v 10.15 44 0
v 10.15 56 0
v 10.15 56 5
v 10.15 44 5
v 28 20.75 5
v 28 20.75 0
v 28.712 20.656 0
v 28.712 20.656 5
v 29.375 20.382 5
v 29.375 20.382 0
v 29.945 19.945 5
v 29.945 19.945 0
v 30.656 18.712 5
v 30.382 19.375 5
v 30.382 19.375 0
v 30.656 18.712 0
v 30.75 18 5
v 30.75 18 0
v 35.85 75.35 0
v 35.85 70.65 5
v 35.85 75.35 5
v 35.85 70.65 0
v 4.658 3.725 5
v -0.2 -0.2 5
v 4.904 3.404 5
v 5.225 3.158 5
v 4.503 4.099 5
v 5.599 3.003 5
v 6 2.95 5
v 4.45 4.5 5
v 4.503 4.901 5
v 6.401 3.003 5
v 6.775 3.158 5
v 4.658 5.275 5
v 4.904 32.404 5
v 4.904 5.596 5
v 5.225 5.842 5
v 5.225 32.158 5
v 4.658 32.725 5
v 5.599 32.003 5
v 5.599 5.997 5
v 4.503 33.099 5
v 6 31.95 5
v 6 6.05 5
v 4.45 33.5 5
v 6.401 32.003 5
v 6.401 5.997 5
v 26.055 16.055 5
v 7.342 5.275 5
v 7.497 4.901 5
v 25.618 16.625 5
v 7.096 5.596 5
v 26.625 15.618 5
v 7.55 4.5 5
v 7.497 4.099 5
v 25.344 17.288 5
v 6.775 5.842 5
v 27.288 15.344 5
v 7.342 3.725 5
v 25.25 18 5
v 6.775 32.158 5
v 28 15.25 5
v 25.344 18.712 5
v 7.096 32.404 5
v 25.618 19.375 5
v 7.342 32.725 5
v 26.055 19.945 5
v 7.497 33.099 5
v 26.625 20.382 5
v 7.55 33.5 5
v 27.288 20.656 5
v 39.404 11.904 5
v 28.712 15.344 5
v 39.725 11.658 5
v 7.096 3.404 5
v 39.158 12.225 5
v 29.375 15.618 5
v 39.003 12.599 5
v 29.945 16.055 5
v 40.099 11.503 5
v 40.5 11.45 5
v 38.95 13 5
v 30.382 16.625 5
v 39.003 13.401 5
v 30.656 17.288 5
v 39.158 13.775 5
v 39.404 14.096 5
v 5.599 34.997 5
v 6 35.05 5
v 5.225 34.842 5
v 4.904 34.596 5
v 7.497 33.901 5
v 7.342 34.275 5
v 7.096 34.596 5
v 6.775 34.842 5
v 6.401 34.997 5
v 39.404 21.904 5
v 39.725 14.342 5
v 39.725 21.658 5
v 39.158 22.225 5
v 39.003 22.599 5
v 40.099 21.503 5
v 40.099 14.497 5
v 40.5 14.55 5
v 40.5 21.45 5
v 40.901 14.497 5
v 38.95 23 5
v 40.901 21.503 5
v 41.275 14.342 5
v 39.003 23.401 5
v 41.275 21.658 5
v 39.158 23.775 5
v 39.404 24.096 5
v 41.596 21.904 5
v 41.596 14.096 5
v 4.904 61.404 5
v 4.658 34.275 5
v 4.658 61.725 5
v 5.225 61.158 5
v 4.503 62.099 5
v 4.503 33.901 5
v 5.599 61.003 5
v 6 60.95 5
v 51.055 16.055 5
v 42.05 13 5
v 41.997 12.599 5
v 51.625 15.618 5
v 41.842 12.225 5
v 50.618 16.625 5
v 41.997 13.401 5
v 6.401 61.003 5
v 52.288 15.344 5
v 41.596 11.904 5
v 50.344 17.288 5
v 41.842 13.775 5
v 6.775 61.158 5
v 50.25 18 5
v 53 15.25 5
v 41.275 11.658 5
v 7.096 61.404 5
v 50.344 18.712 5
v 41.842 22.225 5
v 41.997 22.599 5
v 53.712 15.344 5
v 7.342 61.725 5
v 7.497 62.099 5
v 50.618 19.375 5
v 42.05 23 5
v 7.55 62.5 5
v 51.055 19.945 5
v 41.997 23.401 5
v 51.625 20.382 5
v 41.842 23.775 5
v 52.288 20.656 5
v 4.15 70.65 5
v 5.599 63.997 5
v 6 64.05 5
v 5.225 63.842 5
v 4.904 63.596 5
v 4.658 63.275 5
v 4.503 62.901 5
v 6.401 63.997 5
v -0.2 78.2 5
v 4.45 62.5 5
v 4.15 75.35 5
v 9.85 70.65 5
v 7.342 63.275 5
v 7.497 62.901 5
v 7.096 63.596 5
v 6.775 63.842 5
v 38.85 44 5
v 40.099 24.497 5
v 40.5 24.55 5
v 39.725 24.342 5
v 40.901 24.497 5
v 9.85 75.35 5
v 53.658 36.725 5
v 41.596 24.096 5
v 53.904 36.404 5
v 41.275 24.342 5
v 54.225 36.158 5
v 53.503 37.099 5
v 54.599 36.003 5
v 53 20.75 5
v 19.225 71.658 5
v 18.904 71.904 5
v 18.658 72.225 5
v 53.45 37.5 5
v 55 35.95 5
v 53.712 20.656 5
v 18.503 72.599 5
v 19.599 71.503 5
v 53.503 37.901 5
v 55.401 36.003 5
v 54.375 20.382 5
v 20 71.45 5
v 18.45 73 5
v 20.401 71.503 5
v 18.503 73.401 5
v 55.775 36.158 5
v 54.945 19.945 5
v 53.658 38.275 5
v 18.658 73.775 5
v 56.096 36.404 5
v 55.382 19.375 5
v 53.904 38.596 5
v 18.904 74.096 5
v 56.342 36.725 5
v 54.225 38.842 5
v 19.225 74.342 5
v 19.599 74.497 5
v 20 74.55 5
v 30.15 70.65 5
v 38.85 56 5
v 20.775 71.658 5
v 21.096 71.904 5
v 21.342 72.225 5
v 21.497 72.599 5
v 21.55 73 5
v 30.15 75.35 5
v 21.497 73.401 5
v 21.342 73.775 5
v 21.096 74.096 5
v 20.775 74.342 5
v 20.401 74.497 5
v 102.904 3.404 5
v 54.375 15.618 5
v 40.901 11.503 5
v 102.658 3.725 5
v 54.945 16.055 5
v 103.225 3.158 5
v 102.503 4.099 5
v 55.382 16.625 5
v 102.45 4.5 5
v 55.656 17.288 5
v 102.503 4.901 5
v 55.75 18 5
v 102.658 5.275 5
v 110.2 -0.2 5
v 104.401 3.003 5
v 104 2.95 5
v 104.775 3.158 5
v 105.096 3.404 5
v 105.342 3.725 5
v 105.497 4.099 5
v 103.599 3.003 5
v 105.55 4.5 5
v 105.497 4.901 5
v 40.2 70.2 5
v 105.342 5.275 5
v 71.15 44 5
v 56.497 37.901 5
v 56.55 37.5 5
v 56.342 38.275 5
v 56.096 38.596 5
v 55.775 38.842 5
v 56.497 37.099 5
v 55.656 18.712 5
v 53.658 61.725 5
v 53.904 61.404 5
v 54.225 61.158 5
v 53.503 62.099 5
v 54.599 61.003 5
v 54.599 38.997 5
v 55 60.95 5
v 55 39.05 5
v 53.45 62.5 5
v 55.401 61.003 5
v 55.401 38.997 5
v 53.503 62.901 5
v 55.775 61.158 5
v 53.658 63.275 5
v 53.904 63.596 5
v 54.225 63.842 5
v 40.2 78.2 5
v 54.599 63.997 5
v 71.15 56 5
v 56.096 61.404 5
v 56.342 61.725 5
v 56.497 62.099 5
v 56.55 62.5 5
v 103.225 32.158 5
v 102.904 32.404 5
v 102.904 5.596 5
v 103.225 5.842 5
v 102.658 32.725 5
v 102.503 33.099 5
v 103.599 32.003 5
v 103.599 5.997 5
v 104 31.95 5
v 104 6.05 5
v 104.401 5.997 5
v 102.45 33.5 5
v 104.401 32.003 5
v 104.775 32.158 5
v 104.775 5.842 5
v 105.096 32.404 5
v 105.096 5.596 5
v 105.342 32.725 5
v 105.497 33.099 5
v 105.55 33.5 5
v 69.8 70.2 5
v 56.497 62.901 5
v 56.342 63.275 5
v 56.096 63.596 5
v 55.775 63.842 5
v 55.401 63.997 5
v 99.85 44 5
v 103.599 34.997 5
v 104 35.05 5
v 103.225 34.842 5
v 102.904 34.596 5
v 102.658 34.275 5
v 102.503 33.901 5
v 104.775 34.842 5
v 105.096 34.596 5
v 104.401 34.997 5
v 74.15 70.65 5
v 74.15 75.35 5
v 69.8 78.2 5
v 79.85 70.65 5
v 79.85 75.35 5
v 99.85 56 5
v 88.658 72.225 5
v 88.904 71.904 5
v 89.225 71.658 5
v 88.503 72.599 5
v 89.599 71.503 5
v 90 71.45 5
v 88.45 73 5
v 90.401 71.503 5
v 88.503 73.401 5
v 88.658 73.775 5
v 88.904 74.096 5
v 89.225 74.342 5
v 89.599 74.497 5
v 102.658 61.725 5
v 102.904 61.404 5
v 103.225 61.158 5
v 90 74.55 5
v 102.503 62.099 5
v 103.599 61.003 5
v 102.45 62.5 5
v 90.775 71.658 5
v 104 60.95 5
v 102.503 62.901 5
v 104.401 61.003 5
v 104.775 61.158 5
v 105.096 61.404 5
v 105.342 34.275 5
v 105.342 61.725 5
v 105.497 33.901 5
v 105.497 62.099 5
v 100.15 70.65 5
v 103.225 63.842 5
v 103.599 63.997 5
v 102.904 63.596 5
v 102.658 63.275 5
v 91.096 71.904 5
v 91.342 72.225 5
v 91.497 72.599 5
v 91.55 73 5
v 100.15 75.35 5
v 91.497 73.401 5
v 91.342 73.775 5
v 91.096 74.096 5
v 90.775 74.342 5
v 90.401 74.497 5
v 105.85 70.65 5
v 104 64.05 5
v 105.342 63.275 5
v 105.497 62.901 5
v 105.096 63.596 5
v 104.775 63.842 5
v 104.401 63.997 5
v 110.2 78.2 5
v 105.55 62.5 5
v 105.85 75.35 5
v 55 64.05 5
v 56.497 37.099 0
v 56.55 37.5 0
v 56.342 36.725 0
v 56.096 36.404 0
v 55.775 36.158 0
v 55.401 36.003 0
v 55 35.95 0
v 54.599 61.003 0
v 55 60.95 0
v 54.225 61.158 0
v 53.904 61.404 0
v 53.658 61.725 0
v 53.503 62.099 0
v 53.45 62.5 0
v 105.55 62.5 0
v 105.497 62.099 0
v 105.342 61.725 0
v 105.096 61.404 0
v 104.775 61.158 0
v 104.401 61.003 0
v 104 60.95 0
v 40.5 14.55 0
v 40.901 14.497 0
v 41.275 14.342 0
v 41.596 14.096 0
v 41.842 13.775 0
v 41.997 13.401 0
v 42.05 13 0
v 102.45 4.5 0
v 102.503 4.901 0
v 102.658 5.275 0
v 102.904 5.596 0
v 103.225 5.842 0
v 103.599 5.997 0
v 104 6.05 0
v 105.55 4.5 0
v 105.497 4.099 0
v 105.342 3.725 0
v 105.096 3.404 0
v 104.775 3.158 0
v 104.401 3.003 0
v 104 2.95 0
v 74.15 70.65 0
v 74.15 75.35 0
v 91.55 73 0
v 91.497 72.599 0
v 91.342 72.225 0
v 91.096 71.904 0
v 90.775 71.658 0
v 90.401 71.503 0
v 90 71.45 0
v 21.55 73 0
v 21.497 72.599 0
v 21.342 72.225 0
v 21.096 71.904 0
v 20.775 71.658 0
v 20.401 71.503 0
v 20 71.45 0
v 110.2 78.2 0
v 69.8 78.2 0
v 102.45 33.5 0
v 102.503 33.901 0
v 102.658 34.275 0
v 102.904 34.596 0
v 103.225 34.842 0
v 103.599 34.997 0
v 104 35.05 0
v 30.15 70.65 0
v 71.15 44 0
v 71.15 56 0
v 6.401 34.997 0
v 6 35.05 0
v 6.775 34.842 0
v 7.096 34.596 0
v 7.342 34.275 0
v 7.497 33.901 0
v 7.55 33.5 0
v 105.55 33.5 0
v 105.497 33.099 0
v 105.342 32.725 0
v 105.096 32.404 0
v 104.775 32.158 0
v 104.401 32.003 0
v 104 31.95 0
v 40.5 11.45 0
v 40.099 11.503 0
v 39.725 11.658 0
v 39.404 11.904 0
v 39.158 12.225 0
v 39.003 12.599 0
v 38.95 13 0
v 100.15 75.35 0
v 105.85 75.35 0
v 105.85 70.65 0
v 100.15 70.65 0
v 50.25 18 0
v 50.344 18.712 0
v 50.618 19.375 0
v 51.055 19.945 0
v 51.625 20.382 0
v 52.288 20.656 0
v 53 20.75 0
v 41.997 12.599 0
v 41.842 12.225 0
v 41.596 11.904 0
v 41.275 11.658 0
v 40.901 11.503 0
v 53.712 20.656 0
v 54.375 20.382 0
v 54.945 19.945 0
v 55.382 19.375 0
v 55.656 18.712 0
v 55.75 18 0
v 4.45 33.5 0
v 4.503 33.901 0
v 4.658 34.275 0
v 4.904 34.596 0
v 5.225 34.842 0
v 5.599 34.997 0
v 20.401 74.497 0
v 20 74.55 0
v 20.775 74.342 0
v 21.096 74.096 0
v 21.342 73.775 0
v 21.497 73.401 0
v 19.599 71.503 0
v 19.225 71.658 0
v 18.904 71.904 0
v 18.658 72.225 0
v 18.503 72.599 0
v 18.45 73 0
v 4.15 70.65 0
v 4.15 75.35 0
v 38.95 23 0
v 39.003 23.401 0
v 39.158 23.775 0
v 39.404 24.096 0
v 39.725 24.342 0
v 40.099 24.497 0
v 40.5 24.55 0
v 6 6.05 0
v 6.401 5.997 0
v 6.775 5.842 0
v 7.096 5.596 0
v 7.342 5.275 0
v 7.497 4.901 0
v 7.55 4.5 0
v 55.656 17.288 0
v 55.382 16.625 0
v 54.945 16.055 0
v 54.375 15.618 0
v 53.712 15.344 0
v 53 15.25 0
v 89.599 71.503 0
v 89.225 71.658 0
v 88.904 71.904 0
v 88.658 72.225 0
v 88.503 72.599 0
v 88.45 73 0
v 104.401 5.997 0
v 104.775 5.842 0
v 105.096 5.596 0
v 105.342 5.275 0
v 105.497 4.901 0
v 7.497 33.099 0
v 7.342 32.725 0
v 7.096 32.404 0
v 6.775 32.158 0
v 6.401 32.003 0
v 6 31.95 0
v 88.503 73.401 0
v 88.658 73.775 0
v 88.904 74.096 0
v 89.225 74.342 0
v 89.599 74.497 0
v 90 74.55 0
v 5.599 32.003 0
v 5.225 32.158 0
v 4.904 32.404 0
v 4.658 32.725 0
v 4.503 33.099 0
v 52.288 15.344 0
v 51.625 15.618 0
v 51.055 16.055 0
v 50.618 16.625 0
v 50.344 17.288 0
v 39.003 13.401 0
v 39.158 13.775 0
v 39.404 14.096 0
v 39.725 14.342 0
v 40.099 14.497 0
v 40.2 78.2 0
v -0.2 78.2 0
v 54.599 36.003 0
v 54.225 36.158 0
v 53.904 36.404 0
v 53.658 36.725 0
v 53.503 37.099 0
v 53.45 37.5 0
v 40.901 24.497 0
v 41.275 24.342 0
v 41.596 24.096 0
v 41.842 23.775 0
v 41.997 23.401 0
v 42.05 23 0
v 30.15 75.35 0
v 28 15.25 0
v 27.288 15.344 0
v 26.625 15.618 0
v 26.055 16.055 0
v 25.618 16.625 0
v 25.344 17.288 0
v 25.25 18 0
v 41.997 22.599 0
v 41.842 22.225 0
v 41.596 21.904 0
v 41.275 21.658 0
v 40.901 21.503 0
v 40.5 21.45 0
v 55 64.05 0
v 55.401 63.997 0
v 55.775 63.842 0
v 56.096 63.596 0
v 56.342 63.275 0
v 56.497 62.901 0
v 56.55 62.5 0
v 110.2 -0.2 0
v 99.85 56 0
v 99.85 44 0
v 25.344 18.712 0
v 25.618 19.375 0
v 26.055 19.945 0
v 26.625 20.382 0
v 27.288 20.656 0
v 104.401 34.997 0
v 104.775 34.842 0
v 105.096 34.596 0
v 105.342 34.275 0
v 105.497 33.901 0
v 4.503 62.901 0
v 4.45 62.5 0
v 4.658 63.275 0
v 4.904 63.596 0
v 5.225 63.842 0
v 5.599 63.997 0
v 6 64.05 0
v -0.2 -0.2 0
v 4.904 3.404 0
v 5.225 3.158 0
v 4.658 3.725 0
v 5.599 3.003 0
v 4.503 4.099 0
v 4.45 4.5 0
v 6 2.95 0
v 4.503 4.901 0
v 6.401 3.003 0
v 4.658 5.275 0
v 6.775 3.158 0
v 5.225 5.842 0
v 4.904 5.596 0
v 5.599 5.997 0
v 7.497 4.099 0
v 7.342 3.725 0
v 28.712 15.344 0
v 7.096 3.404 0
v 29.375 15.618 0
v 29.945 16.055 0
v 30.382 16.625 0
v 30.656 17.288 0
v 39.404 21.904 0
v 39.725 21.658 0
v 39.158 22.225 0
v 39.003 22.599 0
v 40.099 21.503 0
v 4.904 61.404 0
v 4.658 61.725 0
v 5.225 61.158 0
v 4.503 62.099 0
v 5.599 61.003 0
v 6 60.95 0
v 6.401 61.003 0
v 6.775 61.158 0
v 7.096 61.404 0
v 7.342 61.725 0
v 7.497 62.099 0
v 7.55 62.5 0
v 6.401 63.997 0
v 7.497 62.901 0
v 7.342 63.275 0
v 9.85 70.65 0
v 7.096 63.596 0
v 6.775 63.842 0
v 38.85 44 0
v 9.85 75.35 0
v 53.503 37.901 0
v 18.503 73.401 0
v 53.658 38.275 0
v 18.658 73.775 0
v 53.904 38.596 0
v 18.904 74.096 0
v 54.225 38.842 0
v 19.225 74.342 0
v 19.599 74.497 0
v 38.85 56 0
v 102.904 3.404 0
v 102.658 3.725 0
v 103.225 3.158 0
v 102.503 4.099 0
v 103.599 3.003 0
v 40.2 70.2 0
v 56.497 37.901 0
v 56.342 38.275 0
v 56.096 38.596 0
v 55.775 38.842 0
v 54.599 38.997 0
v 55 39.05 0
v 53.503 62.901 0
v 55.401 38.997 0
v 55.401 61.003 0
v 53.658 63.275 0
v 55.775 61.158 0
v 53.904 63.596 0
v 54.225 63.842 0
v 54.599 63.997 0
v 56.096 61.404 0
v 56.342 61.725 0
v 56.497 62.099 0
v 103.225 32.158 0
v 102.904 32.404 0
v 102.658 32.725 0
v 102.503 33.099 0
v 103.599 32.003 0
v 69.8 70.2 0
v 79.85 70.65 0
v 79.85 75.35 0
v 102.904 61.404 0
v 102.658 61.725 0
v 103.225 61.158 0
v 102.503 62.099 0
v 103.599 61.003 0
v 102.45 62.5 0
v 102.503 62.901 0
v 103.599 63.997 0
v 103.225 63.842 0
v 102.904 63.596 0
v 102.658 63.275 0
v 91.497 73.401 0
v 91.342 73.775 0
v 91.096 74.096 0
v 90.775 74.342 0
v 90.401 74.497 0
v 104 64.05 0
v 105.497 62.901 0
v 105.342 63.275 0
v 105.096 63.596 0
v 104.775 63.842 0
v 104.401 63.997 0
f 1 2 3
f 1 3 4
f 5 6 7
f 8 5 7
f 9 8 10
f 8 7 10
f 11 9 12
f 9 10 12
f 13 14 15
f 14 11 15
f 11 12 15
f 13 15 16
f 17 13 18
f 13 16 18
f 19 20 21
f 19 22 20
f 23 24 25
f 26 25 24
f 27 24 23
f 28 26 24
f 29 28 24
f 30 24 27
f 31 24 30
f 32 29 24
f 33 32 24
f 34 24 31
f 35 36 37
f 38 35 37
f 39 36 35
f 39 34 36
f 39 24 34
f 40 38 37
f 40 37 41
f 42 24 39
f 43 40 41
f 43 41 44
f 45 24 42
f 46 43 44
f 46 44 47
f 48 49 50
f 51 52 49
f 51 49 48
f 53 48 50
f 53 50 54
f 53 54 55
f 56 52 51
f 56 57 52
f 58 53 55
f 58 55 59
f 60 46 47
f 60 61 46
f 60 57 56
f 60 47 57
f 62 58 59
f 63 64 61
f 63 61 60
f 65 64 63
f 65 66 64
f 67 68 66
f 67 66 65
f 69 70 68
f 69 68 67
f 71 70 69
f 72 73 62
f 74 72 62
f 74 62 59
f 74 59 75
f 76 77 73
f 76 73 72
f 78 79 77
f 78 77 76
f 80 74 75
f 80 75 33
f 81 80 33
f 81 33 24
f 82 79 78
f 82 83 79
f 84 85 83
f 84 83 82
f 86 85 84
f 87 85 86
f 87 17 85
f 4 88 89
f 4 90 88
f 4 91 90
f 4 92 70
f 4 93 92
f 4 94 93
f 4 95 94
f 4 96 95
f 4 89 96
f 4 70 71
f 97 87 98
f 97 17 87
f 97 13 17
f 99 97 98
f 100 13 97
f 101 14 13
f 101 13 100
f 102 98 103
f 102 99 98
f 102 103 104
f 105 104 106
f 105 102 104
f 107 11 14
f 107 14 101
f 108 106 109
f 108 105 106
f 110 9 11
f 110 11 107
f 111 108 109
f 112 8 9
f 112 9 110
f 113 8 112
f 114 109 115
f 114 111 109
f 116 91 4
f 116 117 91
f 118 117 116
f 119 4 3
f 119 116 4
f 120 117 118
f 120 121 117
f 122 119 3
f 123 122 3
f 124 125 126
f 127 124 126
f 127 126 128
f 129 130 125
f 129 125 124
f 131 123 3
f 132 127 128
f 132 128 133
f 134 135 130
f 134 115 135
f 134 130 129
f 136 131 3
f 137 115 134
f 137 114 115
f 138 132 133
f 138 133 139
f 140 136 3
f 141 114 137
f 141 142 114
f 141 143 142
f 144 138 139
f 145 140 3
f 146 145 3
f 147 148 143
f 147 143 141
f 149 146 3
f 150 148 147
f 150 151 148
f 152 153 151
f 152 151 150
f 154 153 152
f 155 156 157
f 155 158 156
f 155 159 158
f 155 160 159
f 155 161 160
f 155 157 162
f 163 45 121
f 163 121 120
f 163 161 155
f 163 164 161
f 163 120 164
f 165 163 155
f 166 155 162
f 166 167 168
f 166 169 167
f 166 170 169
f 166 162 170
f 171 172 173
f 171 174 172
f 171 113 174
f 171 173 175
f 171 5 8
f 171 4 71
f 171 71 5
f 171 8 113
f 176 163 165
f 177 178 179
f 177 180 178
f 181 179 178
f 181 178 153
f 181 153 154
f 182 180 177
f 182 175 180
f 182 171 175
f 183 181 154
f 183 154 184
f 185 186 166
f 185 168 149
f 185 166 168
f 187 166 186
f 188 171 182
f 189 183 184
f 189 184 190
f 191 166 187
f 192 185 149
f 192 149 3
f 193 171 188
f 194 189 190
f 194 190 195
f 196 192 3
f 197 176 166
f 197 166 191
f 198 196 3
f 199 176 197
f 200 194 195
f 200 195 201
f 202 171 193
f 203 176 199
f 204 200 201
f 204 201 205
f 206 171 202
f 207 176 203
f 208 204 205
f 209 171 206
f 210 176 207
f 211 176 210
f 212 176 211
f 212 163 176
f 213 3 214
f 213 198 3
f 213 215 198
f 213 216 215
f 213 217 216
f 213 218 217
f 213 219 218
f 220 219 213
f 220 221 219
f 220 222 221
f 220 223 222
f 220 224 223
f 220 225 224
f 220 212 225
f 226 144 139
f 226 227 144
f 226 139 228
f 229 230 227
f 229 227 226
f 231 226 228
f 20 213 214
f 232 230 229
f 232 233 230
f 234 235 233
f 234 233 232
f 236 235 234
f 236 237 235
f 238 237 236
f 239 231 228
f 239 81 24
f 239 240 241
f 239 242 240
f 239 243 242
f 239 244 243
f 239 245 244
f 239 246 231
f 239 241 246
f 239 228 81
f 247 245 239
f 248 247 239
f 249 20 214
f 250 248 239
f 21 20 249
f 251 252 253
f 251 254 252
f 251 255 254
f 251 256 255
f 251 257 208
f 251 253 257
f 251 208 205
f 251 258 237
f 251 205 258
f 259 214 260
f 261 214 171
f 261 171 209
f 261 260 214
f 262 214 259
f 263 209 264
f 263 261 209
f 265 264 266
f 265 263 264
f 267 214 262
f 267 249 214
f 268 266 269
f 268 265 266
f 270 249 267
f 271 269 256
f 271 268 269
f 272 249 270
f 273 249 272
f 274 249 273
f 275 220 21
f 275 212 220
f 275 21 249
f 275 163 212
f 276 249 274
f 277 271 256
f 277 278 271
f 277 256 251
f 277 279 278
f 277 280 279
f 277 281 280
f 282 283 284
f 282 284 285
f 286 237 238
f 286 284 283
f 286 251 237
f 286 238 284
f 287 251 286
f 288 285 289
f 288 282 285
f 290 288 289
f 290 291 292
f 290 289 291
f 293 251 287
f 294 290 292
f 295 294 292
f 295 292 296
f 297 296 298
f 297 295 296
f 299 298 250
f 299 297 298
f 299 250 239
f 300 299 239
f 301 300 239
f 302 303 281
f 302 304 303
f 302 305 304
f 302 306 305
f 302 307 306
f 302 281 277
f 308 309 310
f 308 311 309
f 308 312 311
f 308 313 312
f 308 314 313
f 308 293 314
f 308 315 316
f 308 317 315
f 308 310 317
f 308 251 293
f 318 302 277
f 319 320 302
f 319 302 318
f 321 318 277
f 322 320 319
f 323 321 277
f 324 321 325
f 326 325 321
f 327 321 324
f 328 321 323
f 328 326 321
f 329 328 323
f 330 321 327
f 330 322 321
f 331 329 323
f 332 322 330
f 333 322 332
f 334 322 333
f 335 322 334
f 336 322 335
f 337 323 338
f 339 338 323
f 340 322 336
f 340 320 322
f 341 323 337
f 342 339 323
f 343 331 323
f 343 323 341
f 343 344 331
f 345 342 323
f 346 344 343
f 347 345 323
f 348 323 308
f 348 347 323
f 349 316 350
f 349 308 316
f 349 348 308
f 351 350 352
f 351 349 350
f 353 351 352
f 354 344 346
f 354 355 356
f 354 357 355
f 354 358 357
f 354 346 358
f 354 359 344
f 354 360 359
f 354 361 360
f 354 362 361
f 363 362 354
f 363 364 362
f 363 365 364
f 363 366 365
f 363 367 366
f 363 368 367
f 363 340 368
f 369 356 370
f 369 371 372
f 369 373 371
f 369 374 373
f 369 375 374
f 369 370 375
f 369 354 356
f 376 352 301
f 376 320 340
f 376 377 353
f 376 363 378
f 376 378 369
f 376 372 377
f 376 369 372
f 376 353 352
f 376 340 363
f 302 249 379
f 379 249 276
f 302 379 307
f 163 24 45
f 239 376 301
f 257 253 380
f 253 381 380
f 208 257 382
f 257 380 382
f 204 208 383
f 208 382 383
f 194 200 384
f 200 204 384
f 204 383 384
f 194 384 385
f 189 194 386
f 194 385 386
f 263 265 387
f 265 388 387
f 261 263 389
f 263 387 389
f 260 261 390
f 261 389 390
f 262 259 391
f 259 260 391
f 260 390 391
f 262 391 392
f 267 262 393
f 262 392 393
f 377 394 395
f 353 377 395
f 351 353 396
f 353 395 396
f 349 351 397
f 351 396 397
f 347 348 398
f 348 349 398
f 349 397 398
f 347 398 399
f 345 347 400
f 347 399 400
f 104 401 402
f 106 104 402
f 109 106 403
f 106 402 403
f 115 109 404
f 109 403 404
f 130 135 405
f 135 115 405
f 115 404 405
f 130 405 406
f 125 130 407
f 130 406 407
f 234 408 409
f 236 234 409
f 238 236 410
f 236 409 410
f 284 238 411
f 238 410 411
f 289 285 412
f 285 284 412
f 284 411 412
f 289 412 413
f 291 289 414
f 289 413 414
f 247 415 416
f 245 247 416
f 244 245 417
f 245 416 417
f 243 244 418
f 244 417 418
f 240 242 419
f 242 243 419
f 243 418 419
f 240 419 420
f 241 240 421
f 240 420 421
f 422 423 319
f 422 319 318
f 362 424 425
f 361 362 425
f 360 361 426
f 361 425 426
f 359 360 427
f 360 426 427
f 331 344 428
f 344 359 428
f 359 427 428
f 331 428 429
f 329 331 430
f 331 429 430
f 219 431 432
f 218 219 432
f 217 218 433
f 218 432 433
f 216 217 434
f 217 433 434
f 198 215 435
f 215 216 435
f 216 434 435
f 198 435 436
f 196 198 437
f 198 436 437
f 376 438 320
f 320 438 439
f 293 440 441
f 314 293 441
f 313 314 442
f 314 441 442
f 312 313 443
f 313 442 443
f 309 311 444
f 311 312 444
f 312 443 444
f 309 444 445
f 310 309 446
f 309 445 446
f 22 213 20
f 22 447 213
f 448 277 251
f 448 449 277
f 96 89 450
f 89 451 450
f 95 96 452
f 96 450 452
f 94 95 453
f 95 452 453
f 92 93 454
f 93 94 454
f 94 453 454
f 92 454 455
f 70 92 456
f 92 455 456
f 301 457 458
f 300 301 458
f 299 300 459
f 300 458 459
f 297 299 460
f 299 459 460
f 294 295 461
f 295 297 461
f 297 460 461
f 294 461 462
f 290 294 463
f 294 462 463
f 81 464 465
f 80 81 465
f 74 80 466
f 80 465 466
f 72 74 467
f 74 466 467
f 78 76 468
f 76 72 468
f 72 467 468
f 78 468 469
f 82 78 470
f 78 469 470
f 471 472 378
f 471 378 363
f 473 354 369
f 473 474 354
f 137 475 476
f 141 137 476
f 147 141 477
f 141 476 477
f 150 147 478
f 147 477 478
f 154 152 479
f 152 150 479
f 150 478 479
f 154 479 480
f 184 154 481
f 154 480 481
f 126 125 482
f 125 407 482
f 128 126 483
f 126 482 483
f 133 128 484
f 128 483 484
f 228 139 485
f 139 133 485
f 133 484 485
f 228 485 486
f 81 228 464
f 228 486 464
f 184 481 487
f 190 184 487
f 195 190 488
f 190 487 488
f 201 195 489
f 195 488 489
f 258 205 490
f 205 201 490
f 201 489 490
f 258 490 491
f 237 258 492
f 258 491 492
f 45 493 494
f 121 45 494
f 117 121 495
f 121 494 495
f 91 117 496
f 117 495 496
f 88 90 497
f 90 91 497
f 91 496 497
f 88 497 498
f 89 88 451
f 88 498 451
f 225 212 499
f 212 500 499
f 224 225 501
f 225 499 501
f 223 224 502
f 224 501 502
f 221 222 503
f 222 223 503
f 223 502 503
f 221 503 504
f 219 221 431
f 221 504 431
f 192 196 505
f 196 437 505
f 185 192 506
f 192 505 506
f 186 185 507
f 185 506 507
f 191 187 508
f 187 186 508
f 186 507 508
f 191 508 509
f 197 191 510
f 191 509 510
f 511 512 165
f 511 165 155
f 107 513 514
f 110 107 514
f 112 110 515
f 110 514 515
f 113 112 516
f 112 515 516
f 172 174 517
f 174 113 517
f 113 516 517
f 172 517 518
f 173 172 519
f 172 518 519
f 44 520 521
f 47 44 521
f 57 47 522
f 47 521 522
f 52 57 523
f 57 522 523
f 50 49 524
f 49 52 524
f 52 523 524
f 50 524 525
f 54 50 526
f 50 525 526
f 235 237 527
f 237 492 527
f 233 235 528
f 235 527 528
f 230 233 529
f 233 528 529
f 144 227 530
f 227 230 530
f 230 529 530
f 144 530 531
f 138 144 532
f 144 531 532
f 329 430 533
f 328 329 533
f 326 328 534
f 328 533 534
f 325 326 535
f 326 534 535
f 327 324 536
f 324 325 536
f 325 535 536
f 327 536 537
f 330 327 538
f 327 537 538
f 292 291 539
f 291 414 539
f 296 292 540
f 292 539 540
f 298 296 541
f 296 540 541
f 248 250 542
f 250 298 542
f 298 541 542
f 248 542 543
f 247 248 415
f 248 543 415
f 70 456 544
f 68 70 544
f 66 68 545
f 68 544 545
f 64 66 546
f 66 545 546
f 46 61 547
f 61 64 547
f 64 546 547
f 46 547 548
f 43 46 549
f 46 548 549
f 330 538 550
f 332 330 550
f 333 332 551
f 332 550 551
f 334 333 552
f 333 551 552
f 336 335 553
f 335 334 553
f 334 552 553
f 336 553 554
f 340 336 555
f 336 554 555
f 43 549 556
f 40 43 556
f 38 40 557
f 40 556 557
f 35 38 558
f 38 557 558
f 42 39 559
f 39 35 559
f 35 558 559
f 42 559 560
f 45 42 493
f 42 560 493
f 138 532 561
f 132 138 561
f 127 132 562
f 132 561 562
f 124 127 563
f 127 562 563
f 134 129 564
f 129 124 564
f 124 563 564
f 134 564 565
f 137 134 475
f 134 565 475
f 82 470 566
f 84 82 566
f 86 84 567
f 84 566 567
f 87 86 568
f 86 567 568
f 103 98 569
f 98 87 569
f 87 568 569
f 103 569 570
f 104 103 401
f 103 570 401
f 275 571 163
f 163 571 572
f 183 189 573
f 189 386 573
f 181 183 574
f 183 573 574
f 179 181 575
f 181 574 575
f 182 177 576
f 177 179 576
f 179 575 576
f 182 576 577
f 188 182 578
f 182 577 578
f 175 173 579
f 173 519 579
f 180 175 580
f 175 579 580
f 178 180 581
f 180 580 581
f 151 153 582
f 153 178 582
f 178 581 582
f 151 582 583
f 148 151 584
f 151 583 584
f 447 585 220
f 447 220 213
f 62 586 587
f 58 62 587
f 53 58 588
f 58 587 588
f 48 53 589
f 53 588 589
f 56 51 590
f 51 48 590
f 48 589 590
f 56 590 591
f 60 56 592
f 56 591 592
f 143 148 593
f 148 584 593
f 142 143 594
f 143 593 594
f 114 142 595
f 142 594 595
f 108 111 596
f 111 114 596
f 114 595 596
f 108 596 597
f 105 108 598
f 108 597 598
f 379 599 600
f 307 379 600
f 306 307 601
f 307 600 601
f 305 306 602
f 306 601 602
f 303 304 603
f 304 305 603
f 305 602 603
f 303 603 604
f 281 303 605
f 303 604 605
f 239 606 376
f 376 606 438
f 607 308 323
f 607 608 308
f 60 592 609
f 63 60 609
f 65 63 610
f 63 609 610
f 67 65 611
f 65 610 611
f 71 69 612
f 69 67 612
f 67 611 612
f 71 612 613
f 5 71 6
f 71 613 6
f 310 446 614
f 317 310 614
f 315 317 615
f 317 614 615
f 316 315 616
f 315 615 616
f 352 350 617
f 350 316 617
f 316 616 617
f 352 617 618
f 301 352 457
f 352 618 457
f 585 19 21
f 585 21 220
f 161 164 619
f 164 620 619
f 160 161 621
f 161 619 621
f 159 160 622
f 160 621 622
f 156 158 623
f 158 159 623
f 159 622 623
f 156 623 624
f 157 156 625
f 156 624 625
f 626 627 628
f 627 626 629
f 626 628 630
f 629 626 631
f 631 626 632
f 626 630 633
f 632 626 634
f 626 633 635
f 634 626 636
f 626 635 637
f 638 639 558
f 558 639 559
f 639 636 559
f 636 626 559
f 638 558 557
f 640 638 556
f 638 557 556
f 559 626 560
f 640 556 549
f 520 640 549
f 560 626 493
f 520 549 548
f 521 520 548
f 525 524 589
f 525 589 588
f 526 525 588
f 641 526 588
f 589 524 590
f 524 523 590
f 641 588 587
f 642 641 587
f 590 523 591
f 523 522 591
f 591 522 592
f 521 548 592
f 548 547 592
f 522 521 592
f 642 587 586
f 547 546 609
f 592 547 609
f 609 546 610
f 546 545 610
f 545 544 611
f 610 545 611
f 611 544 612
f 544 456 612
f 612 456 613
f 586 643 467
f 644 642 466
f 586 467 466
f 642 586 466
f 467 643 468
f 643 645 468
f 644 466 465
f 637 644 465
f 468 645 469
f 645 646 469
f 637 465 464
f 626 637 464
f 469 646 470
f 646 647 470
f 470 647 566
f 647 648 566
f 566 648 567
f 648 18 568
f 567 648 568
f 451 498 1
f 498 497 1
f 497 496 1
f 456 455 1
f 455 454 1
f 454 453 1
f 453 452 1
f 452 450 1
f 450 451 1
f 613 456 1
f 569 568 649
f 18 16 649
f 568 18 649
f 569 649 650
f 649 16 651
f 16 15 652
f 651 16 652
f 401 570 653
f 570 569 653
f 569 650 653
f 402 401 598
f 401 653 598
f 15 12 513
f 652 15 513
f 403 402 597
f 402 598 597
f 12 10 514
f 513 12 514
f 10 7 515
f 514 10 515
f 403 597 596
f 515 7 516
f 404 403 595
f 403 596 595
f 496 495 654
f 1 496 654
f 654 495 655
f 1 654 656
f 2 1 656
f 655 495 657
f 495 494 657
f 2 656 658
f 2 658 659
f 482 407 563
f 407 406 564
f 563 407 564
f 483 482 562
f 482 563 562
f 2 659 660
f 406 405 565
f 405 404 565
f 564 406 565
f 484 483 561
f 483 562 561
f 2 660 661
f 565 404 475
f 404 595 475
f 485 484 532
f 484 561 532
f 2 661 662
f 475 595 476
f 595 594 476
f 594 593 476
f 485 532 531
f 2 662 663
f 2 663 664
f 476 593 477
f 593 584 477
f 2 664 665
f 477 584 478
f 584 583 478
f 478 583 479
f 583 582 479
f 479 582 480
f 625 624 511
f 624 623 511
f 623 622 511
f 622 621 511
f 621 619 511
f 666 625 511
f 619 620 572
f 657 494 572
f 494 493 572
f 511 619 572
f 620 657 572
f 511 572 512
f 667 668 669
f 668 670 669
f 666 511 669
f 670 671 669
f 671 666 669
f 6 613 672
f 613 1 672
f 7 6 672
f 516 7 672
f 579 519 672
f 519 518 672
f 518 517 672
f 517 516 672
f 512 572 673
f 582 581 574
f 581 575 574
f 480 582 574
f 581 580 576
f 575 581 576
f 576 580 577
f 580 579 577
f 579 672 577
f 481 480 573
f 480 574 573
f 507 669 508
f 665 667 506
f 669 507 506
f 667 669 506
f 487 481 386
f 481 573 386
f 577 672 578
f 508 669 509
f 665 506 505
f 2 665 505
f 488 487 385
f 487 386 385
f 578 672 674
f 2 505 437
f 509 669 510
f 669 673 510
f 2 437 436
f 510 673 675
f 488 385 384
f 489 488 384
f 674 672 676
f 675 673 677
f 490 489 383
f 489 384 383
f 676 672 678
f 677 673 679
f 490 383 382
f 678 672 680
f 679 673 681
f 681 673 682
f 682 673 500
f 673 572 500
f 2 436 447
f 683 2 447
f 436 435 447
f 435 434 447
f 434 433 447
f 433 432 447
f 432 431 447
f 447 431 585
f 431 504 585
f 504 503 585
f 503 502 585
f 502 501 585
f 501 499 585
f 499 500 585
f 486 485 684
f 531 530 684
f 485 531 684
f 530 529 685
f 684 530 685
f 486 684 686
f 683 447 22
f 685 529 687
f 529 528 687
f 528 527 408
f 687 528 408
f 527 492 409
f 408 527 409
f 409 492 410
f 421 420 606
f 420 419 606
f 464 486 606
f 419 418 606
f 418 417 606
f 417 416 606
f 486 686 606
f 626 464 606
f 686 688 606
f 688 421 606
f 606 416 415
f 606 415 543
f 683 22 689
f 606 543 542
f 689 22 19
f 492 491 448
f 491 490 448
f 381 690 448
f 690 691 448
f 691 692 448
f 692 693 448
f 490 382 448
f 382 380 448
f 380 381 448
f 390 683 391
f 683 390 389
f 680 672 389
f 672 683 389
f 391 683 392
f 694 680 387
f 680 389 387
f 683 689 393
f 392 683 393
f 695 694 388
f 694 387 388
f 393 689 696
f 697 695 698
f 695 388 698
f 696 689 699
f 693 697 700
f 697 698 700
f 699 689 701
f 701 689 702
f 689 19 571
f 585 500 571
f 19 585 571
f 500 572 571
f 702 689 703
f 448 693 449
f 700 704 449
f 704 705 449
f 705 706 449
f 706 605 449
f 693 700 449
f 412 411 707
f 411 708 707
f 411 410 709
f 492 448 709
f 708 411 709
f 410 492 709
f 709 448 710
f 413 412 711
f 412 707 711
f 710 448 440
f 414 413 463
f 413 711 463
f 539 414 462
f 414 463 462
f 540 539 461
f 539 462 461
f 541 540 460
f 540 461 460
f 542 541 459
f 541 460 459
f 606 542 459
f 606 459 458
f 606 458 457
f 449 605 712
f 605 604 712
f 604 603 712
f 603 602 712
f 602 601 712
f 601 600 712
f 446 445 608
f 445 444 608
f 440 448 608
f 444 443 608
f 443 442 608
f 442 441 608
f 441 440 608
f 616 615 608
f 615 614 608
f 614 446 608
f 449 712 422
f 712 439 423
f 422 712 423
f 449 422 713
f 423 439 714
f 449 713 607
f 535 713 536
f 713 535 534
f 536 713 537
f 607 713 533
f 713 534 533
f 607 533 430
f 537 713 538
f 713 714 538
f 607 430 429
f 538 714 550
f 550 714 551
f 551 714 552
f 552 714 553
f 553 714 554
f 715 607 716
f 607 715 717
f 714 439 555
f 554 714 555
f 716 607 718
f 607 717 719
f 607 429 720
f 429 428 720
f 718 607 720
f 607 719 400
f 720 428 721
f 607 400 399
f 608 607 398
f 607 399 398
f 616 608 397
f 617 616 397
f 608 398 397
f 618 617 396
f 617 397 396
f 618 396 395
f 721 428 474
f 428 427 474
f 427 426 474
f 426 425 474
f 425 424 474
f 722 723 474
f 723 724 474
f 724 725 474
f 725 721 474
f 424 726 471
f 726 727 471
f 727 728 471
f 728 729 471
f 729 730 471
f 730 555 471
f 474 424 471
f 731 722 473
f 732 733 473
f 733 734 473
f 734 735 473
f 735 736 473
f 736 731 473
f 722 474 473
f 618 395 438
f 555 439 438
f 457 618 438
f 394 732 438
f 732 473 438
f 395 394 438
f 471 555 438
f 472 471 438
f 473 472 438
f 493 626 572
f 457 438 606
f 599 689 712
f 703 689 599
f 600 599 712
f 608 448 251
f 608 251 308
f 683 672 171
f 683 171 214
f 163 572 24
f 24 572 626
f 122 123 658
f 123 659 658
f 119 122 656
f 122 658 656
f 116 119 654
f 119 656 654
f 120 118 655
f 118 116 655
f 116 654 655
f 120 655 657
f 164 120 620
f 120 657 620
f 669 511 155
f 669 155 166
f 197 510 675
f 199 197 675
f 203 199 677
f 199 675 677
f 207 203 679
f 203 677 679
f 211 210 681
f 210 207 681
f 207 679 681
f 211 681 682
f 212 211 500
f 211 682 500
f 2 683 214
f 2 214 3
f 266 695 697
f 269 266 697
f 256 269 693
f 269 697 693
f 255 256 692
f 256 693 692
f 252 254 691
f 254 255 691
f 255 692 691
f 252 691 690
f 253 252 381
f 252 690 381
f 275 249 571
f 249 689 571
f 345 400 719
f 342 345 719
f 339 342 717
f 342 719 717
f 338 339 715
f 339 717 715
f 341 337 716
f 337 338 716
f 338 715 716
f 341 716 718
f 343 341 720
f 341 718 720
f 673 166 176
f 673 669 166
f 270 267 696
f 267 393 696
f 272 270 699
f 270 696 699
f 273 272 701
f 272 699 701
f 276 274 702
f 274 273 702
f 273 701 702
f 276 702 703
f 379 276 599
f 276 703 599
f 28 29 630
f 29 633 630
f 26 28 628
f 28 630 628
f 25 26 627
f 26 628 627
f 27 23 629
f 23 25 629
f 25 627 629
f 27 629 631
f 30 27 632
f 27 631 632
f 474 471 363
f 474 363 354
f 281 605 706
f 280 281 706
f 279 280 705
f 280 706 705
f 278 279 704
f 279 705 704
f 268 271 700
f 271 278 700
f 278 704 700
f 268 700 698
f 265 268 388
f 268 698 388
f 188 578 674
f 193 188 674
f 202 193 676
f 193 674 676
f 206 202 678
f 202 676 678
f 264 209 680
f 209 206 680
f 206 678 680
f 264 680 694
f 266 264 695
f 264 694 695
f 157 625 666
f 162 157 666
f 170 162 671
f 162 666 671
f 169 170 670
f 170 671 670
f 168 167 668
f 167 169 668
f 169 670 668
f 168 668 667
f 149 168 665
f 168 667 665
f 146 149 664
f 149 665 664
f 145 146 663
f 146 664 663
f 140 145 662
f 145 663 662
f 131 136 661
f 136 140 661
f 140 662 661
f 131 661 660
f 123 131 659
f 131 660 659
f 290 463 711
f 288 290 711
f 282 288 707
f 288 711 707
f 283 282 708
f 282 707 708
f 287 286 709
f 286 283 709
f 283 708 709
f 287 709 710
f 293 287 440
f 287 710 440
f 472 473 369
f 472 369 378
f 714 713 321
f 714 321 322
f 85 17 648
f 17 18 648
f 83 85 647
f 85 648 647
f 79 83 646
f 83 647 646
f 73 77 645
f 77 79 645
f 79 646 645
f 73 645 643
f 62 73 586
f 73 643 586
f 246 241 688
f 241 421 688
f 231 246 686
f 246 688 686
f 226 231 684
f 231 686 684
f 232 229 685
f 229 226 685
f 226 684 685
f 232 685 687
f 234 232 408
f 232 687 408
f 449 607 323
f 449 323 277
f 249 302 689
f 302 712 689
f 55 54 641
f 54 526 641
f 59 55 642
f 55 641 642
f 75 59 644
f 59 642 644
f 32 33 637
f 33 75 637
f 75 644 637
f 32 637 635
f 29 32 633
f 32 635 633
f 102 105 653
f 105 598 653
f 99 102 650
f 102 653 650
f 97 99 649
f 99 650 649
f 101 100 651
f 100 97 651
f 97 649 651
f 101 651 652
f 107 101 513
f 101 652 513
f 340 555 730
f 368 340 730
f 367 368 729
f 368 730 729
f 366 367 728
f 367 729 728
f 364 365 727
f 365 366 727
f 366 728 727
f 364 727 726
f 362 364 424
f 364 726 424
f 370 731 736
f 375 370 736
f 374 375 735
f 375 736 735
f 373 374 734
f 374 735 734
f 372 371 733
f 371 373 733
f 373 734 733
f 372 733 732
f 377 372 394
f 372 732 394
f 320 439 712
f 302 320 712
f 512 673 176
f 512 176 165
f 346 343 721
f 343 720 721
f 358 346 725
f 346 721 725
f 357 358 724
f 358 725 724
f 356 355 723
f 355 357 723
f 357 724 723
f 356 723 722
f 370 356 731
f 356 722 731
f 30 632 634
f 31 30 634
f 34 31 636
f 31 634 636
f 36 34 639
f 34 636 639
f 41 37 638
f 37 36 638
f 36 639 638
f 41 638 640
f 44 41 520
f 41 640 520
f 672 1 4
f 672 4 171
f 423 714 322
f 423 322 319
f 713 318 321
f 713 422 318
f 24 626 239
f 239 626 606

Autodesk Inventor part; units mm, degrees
ref_plane "YZ Plane" through (0, 0, 0) normal (1, 0, 0) x (0, 1, 0)
ref_plane "XZ Plane" through (0, 0, 0) normal (0, 1, 0) x (-1, 0, 0)
ref_plane "XY Plane" through (0, 0, 0) normal (0, 0, 1) x (1, 0, 0)
sketch "Boceto1" plane through (0, 0, 0) normal (0, 0, 1) x (1, 0, 0)
  arc A0 (6, 64.05) -> (4.45, 62.5) centre (6, 62.5) ccw
  arc A1 (4.45, 62.5) -> (6, 60.95) centre (6, 62.5) ccw
  arc A2 (6, 60.95) -> (7.55, 62.5) centre (6, 62.5) ccw
  arc A3 (7.55, 62.5) -> (6, 64.05) centre (6, 62.5) ccw
  arc A4 (55, 64.05) -> (53.45, 62.5) centre (55, 62.5) ccw
  arc A5 (53.45, 62.5) -> (55, 60.95) centre (55, 62.5) ccw
  arc A6 (55, 60.95) -> (56.55, 62.5) centre (55, 62.5) ccw
  arc A7 (56.55, 62.5) -> (55, 64.05) centre (55, 62.5) ccw
  arc A8 (104, 64.05) -> (102.45, 62.5) centre (104, 62.5) ccw
  arc A9 (102.45, 62.5) -> (104, 60.95) centre (104, 62.5) ccw
  arc A10 (104, 60.95) -> (105.55, 62.5) centre (104, 62.5) ccw
  arc A11 (105.55, 62.5) -> (104, 64.05) centre (104, 62.5) ccw
  arc A12 (6, 35.05) -> (4.45, 33.5) centre (6, 33.5) ccw
  arc A13 (4.45, 33.5) -> (6, 31.95) centre (6, 33.5) ccw
  arc A14 (6, 31.95) -> (7.55, 33.5) centre (6, 33.5) ccw
  arc A15 (7.55, 33.5) -> (6, 35.05) centre (6, 33.5) ccw
  arc A16 (55, 39.05) -> (53.45, 37.5) centre (55, 37.5) ccw
  arc A17 (53.45, 37.5) -> (55, 35.95) centre (55, 37.5) ccw
  arc A18 (55, 35.95) -> (56.55, 37.5) centre (55, 37.5) ccw
  arc A19 (56.55, 37.5) -> (55, 39.05) centre (55, 37.5) ccw
  arc A20 (104, 35.05) -> (102.45, 33.5) centre (104, 33.5) ccw
  arc A21 (102.45, 33.5) -> (104, 31.95) centre (104, 33.5) ccw
  arc A22 (104, 31.95) -> (105.55, 33.5) centre (104, 33.5) ccw
  arc A23 (105.55, 33.5) -> (104, 35.05) centre (104, 33.5) ccw
  arc A24 (6, 6.05) -> (4.45, 4.5) centre (6, 4.5) ccw
  arc A25 (4.45, 4.5) -> (6, 2.95) centre (6, 4.5) ccw
  arc A26 (6, 2.95) -> (7.55, 4.5) centre (6, 4.5) ccw
  arc A27 (7.55, 4.5) -> (6, 6.05) centre (6, 4.5) ccw
  arc A28 (104, 6.05) -> (102.45, 4.5) centre (104, 4.5) ccw
  arc A29 (102.45, 4.5) -> (104, 2.95) centre (104, 4.5) ccw
  arc A30 (104, 2.95) -> (105.55, 4.5) centre (104, 4.5) ccw
  arc A31 (105.55, 4.5) -> (104, 6.05) centre (104, 4.5) ccw
  arc A32 (40.5, 24.55) -> (38.95, 23) centre (40.5, 23) ccw
  arc A33 (38.95, 23) -> (40.5, 21.45) centre (40.5, 23) ccw
  arc A34 (40.5, 21.45) -> (42.05, 23) centre (40.5, 23) ccw
  arc A35 (42.05, 23) -> (40.5, 24.55) centre (40.5, 23) ccw
  arc A36 (40.5, 14.55) -> (38.95, 13) centre (40.5, 13) ccw
  arc A37 (38.95, 13) -> (40.5, 11.45) centre (40.5, 13) ccw
  arc A38 (40.5, 11.45) -> (42.05, 13) centre (40.5, 13) ccw
  arc A39 (42.05, 13) -> (40.5, 14.55) centre (40.5, 13) ccw
  arc A40 (20, 74.55) -> (18.45, 73) centre (20, 73) ccw
  arc A41 (18.45, 73) -> (20, 71.45) centre (20, 73) ccw
  arc A42 (20, 71.45) -> (21.55, 73) centre (20, 73) ccw
  arc A43 (21.55, 73) -> (20, 74.55) centre (20, 73) ccw
  arc A44 (90, 74.55) -> (88.45, 73) centre (90, 73) ccw
  arc A45 (88.45, 73) -> (90, 71.45) centre (90, 73) ccw
  arc A46 (90, 71.45) -> (91.55, 73) centre (90, 73) ccw
  arc A47 (91.55, 73) -> (90, 74.55) centre (90, 73) ccw
  line L0 (9.85, 75.35) -> (4.15, 75.35)
  line L1 (4.15, 75.35) -> (4.15, 70.65)
  line L2 (4.15, 70.65) -> (9.85, 70.65)
  line L3 (9.85, 70.65) -> (9.85, 75.35)
  line L4 (35.85, 70.65) -> (35.85, 75.35)
  line L5 (35.85, 75.35) -> (30.15, 75.35)
  line L6 (30.15, 75.35) -> (30.15, 70.65)
  line L7 (30.15, 70.65) -> (35.85, 70.65)
  line L8 (74.15, 70.65) -> (79.85, 70.65)
  line L9 (79.85, 70.65) -> (79.85, 75.35)
  line L10 (79.85, 75.35) -> (74.15, 75.35)
  line L11 (74.15, 75.35) -> (74.15, 70.65)
  line L12 (105.85, 70.65) -> (105.85, 75.35)
  line L13 (105.85, 75.35) -> (100.15, 75.35)
  line L14 (100.15, 75.35) -> (100.15, 70.65)
  line L15 (100.15, 70.65) -> (105.85, 70.65)
  line L16 (38.85, 44) -> (38.85, 56)
  line L17 (38.85, 56) -> (10.15, 56)
  line L18 (10.15, 56) -> (10.15, 44)
  line L19 (10.15, 44) -> (38.85, 44)
  line L20 (71.15, 44) -> (99.85, 44)
  line L21 (99.85, 44) -> (99.85, 56)
  line L22 (99.85, 56) -> (71.15, 56)
  line L23 (71.15, 56) -> (71.15, 44)
  line L24 (-0.2, -0.2) -> (110.2, -0.2)
  line L25 (110.2, -0.2) -> (110.2, 78.2)
  line L26 (110.2, 78.2) -> (69.8, 78.2)
  line L27 (69.8, 78.2) -> (69.8, 70.2)
  line L28 (69.8, 70.2) -> (40.2, 70.2)
  line L29 (40.2, 70.2) -> (40.2, 78.2)
  line L30 (40.2, 78.2) -> (-0.2, 78.2)
  line L31 (-0.2, 78.2) -> (-0.2, -0.2)
  arc A48 (28, 20.75) -> (25.25, 18) centre (28, 18) ccw
  arc A49 (25.25, 18) -> (28, 15.25) centre (28, 18) ccw
  arc A50 (28, 15.25) -> (30.75, 18) centre (28, 18) ccw
  arc A51 (30.75, 18) -> (28, 20.75) centre (28, 18) ccw
  arc A52 (53, 20.75) -> (50.25, 18) centre (53, 18) ccw
  arc A53 (50.25, 18) -> (53, 15.25) centre (53, 18) ccw
  arc A54 (53, 15.25) -> (55.75, 18) centre (53, 18) ccw
  arc A55 (55.75, 18) -> (53, 20.75) centre (53, 18) ccw
  point P0 (0, 0)
extrude "Extrusión1" add sketch "Boceto1" along normal blind 5
properties part number "carro x lado polea pieza1"
